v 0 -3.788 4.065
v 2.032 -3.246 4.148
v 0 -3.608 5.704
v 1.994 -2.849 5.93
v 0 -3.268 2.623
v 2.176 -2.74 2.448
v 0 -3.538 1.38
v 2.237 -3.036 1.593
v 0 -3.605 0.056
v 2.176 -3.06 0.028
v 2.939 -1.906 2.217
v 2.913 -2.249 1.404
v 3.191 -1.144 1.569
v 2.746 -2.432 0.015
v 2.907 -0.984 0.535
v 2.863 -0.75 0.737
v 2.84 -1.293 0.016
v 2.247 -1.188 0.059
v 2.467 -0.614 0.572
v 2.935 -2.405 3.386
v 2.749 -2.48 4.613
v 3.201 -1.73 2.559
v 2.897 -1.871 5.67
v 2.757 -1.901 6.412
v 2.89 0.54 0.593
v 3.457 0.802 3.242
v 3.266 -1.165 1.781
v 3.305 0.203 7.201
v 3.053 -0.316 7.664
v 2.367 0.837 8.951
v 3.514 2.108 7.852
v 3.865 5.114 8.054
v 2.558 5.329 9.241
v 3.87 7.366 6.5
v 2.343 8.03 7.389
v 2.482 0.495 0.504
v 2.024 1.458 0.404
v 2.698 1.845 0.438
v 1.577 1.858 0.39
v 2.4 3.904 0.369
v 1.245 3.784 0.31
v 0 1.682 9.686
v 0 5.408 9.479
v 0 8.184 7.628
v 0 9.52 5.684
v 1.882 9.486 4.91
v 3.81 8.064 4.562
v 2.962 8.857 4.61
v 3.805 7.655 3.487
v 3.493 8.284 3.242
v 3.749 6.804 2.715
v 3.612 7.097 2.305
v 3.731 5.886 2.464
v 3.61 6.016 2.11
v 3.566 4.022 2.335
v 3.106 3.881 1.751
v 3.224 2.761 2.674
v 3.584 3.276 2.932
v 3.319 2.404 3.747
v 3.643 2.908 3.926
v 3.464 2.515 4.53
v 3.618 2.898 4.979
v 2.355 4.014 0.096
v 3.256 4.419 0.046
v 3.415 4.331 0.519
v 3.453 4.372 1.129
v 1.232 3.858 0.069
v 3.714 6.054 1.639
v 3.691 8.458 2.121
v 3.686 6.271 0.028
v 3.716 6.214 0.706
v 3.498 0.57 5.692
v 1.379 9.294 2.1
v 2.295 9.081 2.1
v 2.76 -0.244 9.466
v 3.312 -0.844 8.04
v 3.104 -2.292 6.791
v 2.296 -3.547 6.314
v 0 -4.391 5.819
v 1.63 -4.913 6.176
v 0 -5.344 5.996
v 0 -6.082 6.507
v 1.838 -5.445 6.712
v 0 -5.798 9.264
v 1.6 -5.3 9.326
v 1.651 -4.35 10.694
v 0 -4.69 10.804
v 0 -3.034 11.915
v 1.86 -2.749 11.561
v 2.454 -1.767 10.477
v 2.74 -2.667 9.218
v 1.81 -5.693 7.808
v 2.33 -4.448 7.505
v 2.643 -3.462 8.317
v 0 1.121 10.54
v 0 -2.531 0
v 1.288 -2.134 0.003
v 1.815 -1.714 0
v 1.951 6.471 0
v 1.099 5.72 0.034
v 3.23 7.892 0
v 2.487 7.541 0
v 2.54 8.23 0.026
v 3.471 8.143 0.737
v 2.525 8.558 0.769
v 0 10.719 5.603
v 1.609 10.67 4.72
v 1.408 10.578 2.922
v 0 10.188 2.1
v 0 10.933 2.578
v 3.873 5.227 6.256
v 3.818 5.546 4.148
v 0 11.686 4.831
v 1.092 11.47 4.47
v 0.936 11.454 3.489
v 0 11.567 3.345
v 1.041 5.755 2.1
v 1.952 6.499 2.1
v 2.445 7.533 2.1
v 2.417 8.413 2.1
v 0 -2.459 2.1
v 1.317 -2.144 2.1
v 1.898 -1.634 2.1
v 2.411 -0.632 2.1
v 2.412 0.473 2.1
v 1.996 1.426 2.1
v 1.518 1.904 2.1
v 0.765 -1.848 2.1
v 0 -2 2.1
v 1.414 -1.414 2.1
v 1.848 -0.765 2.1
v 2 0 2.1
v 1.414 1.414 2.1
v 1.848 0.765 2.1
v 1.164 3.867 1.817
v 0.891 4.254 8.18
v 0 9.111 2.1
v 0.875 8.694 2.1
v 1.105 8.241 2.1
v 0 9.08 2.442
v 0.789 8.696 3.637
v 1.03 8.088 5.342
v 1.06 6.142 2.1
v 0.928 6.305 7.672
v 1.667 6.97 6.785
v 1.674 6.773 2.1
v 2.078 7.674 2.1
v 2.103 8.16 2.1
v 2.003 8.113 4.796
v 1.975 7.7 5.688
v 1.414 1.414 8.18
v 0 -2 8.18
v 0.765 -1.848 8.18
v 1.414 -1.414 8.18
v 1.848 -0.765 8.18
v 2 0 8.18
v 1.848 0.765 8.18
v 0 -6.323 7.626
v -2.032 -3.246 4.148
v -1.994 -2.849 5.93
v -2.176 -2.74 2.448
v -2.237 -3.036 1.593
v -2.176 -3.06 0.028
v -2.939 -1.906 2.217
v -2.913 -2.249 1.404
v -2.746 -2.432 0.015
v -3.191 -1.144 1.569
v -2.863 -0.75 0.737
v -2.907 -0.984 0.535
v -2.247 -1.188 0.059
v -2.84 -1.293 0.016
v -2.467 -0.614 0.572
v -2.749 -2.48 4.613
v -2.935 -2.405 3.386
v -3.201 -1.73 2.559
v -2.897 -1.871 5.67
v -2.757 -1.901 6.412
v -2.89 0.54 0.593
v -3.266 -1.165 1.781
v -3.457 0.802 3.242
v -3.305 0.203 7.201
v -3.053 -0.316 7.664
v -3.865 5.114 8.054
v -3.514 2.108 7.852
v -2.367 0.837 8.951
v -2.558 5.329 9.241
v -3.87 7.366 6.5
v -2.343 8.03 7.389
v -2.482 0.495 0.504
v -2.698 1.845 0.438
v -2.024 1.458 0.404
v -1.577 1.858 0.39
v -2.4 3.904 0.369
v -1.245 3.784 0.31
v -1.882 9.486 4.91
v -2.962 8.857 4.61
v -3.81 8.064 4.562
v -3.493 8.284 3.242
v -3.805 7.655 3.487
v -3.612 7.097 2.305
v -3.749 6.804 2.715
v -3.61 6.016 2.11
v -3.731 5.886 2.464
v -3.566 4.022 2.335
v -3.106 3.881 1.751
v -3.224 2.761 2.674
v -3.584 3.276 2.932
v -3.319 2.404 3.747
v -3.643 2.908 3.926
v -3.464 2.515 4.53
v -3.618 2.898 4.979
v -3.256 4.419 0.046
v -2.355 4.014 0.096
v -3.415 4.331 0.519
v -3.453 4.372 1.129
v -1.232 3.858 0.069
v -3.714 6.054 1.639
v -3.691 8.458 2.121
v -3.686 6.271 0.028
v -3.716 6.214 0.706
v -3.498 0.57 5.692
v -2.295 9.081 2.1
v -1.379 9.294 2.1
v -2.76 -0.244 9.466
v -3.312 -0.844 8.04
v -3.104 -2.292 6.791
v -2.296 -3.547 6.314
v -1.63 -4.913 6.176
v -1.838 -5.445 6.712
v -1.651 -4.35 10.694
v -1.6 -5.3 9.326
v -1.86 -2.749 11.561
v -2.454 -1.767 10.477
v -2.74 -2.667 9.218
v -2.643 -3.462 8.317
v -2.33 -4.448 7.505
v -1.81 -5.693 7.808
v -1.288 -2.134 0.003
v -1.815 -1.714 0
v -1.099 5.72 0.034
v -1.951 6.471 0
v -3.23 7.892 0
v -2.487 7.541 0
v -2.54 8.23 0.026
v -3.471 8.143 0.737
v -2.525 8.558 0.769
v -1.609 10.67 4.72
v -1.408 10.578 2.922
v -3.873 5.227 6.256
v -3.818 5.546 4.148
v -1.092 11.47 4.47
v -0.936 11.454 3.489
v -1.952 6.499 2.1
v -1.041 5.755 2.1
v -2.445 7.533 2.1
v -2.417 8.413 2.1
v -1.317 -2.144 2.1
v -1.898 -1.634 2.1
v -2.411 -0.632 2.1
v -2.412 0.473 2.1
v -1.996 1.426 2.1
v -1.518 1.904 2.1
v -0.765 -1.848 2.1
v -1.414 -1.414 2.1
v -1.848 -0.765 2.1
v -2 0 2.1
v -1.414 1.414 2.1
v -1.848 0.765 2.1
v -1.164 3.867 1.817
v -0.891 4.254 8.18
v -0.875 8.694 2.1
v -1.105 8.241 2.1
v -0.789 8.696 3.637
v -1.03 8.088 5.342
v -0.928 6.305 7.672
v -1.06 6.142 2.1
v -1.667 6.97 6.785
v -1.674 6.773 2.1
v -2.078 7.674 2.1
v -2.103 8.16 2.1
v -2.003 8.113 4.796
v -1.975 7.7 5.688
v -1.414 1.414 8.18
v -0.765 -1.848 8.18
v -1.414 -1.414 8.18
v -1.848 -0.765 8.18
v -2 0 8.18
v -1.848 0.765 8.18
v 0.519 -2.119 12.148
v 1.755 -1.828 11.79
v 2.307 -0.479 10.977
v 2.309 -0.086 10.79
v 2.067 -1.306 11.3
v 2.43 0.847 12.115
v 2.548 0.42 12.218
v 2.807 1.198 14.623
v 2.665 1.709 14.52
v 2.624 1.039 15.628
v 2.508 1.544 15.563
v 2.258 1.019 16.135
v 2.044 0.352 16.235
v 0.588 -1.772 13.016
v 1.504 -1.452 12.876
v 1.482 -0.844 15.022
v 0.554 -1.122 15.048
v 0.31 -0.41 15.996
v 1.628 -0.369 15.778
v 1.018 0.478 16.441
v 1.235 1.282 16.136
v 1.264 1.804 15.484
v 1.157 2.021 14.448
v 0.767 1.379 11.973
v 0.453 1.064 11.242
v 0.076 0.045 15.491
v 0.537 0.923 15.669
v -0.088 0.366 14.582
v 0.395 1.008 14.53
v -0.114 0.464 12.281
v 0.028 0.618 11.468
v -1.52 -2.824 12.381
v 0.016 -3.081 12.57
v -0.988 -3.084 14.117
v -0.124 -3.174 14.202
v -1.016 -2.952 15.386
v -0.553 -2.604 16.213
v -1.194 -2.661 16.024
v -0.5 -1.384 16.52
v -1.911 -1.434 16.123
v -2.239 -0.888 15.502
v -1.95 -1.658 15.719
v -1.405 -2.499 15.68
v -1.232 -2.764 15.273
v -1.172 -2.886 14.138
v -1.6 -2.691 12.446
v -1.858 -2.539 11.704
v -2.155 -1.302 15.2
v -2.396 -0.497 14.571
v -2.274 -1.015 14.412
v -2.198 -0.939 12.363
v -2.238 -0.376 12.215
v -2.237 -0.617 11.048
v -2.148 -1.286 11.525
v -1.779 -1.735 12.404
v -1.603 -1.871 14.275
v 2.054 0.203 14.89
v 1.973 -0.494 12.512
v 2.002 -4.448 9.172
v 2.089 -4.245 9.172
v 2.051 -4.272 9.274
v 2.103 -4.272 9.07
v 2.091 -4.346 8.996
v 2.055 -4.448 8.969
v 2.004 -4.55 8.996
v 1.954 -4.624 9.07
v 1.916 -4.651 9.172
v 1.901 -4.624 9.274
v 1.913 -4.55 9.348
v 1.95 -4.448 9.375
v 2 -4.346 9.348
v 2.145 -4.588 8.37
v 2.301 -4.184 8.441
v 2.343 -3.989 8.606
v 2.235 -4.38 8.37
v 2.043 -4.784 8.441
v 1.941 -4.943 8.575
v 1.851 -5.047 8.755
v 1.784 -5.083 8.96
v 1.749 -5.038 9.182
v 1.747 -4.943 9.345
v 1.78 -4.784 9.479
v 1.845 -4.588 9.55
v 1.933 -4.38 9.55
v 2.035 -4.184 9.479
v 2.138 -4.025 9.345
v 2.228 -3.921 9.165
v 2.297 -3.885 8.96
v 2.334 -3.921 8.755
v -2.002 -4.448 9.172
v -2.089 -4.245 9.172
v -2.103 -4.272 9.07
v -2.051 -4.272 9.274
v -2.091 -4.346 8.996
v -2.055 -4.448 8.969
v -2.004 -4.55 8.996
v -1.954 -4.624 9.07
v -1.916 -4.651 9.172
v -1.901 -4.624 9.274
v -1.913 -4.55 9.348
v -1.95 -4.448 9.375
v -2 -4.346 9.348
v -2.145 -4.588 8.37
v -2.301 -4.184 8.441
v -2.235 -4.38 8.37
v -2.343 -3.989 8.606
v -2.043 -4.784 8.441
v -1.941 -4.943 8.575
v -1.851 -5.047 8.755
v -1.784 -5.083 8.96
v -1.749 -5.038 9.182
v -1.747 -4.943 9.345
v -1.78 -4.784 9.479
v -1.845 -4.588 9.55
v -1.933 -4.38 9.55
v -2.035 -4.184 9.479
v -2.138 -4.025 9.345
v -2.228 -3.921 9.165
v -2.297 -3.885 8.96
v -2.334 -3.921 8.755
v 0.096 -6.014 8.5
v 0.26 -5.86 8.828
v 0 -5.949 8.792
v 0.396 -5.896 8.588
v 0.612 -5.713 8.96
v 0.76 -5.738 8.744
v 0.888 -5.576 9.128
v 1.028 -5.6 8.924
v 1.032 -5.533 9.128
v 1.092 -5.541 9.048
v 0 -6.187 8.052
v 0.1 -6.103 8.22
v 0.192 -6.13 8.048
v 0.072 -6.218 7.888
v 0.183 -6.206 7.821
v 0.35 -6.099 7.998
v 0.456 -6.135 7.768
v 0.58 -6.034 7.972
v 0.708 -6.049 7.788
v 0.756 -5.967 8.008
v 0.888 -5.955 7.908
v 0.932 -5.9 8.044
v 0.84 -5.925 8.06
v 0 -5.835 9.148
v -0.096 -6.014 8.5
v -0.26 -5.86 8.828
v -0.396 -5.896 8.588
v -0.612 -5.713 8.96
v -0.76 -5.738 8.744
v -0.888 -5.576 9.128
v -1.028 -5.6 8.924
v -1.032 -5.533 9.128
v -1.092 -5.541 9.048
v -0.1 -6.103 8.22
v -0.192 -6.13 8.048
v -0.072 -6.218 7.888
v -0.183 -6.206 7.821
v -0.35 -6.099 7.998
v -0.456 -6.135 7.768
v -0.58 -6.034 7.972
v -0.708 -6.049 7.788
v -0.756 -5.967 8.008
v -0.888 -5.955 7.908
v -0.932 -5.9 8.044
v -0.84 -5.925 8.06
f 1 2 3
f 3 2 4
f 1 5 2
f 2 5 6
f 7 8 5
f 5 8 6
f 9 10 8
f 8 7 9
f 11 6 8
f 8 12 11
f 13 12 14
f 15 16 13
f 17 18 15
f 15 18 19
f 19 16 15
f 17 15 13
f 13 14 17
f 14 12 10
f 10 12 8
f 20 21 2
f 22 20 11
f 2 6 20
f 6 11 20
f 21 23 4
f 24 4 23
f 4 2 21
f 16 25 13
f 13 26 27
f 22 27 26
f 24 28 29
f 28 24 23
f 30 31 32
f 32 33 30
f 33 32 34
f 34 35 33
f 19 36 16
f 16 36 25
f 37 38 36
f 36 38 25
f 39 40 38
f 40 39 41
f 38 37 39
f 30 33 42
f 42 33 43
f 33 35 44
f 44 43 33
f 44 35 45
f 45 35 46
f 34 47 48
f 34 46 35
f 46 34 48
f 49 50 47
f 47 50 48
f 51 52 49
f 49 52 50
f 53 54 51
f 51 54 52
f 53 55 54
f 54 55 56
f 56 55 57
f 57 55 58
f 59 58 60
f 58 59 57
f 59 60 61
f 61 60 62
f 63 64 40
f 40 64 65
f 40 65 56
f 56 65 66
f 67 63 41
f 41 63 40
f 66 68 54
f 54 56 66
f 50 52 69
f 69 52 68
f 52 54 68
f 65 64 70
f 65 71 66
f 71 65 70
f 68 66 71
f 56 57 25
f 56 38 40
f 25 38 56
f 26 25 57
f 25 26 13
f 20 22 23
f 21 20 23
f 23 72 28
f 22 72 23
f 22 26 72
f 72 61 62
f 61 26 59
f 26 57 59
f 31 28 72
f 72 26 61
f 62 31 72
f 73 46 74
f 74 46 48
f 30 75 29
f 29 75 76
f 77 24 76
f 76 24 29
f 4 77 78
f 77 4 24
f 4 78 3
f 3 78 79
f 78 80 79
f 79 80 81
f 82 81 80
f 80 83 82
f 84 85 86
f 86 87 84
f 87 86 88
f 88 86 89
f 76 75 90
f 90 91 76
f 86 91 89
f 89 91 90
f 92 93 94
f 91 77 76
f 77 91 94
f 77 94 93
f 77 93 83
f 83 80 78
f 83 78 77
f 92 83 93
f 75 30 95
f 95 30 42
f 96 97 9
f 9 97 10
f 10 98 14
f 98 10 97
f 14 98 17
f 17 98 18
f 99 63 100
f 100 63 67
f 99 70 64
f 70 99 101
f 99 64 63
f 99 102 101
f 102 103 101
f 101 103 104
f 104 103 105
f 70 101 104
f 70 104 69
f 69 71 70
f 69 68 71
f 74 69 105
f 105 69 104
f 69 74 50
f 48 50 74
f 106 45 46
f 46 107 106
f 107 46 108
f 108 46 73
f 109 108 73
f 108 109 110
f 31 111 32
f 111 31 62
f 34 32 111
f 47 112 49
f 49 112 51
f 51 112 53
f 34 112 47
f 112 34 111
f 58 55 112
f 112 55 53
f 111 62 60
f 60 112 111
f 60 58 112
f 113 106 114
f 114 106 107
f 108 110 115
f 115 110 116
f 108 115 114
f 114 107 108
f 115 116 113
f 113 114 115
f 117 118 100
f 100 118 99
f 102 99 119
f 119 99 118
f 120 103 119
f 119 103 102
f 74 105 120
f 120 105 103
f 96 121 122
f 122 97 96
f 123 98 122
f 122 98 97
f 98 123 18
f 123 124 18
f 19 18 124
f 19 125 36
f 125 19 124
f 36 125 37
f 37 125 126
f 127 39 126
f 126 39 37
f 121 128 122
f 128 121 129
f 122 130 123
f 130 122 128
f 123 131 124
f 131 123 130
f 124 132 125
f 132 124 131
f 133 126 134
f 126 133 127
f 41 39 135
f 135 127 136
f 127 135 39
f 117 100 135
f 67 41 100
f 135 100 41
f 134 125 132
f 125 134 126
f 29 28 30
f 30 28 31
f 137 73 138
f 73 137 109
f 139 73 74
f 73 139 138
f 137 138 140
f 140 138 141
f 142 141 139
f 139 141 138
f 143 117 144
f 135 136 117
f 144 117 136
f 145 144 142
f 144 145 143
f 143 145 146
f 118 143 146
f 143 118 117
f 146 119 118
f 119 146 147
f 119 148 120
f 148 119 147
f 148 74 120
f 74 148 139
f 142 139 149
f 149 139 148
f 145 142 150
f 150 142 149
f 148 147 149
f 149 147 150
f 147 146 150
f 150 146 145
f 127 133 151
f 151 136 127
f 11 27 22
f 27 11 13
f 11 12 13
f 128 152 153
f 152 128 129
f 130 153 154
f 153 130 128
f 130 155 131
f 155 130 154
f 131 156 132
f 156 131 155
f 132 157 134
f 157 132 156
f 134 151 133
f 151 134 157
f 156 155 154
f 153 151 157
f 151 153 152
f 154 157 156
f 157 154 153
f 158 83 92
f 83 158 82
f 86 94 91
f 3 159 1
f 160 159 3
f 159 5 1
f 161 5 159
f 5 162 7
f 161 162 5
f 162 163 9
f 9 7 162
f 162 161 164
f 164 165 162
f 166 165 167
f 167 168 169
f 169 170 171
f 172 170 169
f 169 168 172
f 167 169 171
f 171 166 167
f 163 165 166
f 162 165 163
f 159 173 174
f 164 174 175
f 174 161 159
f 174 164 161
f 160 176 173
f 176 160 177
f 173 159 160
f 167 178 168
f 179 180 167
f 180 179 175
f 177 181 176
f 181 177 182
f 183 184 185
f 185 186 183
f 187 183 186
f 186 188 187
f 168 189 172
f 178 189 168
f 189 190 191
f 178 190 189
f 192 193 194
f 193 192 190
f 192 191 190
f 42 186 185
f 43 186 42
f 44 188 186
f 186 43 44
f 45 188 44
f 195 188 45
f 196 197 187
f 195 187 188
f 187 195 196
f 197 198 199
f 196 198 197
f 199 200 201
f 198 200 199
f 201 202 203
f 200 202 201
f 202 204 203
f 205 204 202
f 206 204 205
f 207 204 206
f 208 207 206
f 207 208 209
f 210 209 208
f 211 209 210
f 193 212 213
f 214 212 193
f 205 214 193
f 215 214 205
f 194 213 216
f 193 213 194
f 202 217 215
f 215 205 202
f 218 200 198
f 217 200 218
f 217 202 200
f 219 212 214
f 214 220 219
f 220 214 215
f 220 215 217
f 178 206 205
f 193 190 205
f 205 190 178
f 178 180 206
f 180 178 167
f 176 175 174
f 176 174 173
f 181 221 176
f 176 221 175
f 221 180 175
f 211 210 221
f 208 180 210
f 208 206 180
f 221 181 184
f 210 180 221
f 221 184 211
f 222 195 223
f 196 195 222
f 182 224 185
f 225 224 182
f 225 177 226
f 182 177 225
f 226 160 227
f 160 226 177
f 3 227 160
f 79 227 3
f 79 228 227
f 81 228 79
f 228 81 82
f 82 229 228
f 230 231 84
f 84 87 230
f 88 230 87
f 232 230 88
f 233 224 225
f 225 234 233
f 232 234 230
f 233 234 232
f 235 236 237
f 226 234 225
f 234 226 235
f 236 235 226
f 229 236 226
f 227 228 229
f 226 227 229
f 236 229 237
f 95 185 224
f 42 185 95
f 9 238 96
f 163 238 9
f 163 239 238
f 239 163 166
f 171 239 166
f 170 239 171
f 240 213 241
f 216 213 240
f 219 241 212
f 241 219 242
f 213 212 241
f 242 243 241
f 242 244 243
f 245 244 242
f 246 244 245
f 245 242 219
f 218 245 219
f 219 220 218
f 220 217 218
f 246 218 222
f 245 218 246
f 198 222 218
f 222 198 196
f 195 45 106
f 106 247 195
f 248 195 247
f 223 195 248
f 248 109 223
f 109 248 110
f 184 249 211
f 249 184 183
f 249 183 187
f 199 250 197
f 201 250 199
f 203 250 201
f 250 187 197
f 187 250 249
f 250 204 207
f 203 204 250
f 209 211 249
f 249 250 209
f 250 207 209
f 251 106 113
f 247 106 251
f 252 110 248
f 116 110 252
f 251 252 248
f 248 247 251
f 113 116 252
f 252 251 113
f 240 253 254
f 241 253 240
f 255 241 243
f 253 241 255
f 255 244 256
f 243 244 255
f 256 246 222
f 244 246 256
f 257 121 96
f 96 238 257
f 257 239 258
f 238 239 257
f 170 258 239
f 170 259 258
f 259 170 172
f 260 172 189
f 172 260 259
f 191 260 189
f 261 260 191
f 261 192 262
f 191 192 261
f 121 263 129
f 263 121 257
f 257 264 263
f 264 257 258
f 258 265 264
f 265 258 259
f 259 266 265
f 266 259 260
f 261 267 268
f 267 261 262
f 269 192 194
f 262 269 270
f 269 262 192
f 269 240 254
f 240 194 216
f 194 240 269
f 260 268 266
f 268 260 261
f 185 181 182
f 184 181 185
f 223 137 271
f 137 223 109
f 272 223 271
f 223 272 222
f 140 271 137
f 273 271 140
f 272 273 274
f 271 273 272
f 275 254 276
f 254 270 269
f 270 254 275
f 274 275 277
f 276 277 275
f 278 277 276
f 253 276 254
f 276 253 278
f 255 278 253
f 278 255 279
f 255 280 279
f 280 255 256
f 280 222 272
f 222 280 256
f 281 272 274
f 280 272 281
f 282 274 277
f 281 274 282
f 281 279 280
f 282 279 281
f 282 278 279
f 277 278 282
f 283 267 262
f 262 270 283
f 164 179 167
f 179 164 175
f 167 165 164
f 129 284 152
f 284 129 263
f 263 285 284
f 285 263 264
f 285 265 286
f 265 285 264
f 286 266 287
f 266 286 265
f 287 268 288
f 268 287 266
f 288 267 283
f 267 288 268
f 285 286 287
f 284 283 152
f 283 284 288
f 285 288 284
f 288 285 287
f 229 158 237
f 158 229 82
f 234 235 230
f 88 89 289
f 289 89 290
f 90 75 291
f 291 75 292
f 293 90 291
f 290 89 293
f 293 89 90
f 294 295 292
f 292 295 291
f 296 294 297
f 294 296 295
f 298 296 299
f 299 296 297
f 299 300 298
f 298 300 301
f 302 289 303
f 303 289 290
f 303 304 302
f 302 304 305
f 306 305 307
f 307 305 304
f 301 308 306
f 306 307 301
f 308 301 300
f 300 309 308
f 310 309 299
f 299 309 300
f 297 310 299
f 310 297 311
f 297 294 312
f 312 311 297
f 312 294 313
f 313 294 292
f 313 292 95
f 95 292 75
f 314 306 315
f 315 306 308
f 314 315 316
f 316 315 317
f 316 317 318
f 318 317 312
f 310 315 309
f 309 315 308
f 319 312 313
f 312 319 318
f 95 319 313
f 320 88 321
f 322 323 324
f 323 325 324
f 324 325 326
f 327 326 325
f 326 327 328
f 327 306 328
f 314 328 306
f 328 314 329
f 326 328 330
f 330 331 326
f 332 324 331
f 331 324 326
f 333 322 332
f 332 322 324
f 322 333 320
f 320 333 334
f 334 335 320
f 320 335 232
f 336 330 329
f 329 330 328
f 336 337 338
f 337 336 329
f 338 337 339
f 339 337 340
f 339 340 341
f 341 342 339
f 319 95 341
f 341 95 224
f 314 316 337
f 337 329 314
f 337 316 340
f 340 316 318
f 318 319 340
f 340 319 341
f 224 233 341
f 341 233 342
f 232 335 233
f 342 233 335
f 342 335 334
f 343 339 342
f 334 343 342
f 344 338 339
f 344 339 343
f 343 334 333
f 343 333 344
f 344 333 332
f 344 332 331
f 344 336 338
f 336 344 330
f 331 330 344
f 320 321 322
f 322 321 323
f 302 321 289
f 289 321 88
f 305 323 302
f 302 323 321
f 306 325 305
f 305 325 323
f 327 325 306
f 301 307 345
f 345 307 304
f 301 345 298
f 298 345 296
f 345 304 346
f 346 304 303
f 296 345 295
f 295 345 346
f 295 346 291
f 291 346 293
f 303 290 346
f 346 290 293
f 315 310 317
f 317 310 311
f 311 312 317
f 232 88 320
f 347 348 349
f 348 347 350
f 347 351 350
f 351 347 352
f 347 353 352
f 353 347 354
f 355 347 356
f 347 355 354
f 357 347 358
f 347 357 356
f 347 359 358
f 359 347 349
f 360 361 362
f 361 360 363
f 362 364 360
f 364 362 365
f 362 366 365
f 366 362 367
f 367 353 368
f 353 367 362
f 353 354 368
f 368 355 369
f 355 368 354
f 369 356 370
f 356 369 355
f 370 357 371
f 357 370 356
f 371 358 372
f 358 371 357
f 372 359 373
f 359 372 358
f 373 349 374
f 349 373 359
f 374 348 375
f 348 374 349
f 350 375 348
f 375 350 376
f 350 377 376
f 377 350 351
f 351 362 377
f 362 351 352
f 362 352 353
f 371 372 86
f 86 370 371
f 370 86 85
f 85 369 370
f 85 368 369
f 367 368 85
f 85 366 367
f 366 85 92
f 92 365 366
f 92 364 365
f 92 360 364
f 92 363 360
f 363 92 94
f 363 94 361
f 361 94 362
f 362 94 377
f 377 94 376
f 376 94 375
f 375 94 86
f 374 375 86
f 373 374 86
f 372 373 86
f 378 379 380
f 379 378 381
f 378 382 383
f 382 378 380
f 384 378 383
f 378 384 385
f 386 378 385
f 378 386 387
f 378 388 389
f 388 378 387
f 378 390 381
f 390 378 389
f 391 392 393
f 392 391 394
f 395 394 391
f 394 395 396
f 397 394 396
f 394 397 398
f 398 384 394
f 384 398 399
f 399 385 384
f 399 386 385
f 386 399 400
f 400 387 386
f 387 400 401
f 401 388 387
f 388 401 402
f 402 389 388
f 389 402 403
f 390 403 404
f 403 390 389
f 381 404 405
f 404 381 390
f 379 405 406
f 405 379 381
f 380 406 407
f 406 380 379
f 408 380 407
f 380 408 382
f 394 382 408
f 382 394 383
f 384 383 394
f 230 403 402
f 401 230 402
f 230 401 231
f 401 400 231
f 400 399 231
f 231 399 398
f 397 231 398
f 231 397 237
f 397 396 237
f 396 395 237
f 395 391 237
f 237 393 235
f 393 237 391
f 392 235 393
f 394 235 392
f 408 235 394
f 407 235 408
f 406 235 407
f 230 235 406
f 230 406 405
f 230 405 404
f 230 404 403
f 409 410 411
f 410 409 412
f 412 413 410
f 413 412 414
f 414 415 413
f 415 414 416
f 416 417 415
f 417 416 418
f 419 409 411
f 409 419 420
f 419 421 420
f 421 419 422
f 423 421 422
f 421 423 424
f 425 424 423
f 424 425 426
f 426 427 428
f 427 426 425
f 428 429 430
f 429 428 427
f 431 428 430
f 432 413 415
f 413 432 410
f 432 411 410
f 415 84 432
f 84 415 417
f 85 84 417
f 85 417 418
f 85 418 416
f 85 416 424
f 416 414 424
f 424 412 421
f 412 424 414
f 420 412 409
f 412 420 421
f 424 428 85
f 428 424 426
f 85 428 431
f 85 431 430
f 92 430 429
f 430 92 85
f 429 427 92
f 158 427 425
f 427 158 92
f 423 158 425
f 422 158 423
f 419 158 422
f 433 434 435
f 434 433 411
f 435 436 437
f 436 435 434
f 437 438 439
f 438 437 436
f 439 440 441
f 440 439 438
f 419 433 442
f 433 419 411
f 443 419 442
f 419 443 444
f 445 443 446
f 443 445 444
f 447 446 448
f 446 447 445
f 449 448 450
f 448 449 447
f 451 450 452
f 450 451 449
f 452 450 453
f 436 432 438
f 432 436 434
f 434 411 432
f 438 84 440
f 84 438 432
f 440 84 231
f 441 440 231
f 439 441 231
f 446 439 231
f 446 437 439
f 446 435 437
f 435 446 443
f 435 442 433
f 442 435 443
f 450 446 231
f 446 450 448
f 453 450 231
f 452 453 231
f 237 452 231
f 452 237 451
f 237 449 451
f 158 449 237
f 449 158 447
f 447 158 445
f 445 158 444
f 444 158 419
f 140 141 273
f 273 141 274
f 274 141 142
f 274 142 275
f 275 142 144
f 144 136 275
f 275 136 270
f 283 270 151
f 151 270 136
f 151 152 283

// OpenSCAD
use <../lib.scad>
use <s/29685p01s01.scad>
use <s/29685p01s02.scad>
use <s/29685s01.scad>
use <s/29685s02.scad>
function ldraw_lib__29685p01() = [
// 0 Animal Bunny with Black Eyes and Pink Nose Pattern
// 0 Name: 29685p01.dat
// 0 Author: Philippe Hurbain [Philo]
// 0 !LDRAW_ORG Part UPDATE 2019-01
// 0 !LICENSE Licensed under CC BY 4.0 : see CAreadme.txt
// 
// 0 BFC CERTIFY CCW
  [0,"BFC","CERTIFY"],
  [0,"BFC","CCW"],
// 
// 0 !KEYWORDS Rabbit
// 
// 0 !HISTORY 2018-01-28 {LEGO Digital Designer} Original part shape
// 0 !HISTORY 2019-05-20 [Philo] File preparation for LDraw Parts Tracker
// 0 !HISTORY 2019-06-28 [PTadmin] Official Update 2019-01
// 
// 
// 1 16 0 0 0 1 0 0 0 1 0 0 0 1 s\29685s01.dat
  [1,16,0,0,0,1,0,0,0,1,0,0,0,1, ldraw_lib__s__29685s01()],
// 1 16 0 0 0 -1 0 0 0 1 0 0 0 1 s\29685s01.dat
  [1,16,0,0,0,-1,0,0,0,1,0,0,0,1, ldraw_lib__s__29685s01()],
// 1 16 0 0 0 1 0 0 0 1 0 0 0 1 s\29685s02.dat
  [1,16,0,0,0,1,0,0,0,1,0,0,0,1, ldraw_lib__s__29685s02()],
// 1 16 0 0 0 1 0 0 0 1 0 0 0 1 s\29685p01s01.dat
  [1,16,0,0,0,1,0,0,0,1,0,0,0,1, ldraw_lib__s__29685p01s01()],
// 1 16 0 0 0 -1 0 0 0 1 0 0 0 1 s\29685p01s01.dat
  [1,16,0,0,0,-1,0,0,0,1,0,0,0,1, ldraw_lib__s__29685p01s01()],
// 1 16 0 0 0 1 0 0 0 1 0 0 0 1 s\29685p01s02.dat
  [1,16,0,0,0,1,0,0,0,1,0,0,0,1, ldraw_lib__s__29685p01s02()],
// 1 16 0 0 0 -1 0 0 0 1 0 0 0 1 s\29685p01s02.dat
  [1,16,0,0,0,-1,0,0,0,1,0,0,0,1, ldraw_lib__s__29685p01s02()],
// 
// 3 16 0 -6.106 22.699 1.973 -9.093 21.741 -1.973 -9.093 21.741
  [3,16,0,-6.106,22.699,1.973,-9.093,21.741,-1.973,-9.093,21.741],
// 3 16 -1.973 -9.093 21.741 1.973 -9.093 21.741 -2.575 -13.355 20.219
  [3,16,-1.973,-9.093,21.741,1.973,-9.093,21.741,-2.575,-13.355,20.219],
// 3 16 -2.575 -13.355 20.219 1.973 -9.093 21.741 2.575 -13.355 20.219
  [3,16,-2.575,-13.355,20.219,1.973,-9.093,21.741,2.575,-13.355,20.219],
// 3 16 -2.575 -13.355 20.219 2.575 -13.355 20.219 -2.32 -19.179 15.762
  [3,16,-2.575,-13.355,20.219,2.575,-13.355,20.219,-2.32,-19.179,15.762],
// 3 16 -2.32 -19.179 15.762 2.575 -13.355 20.219 2.32 -19.179 15.762
  [3,16,-2.32,-19.179,15.762,2.575,-13.355,20.219,2.32,-19.179,15.762],
// 3 16 2.32 -19.179 15.762 2.227 -20.45 10.634 -2.32 -19.179 15.762
  [3,16,2.32,-19.179,15.762,2.227,-20.45,10.634,-2.32,-19.179,15.762],
// 3 16 -2.32 -19.179 15.762 2.227 -20.45 10.634 -2.227 -20.45 10.634
  [3,16,-2.32,-19.179,15.762,2.227,-20.45,10.634,-2.227,-20.45,10.634],
// 3 16 -3.5355 -20.45 3.5355 -2.227 -20.45 10.634 3.5355 -20.45 3.5355
  [3,16,-3.5355,-20.45,3.5355,-2.227,-20.45,10.634,3.5355,-20.45,3.5355],
// 3 16 3.5355 -20.45 3.5355 -2.227 -20.45 10.634 2.227 -20.45 10.634
  [3,16,3.5355,-20.45,3.5355,-2.227,-20.45,10.634,2.227,-20.45,10.634],
// 3 16 3.5355 -20.45 3.5355 0 -20.45 -5 -3.5355 -20.45 3.5355
  [3,16,3.5355,-20.45,3.5355,0,-20.45,-5,-3.5355,-20.45,3.5355],
];
module ldraw_lib__29685p01(step=0, col=false, unit=2/5, alt=false, line=0.2, solid=!$preview)
    makepoly(ldraw_lib__29685p01(), step=step, col=col, unit=unit, alt=alt, line=line, solid=solid);
ldraw_lib__29685p01(line=0.2);
